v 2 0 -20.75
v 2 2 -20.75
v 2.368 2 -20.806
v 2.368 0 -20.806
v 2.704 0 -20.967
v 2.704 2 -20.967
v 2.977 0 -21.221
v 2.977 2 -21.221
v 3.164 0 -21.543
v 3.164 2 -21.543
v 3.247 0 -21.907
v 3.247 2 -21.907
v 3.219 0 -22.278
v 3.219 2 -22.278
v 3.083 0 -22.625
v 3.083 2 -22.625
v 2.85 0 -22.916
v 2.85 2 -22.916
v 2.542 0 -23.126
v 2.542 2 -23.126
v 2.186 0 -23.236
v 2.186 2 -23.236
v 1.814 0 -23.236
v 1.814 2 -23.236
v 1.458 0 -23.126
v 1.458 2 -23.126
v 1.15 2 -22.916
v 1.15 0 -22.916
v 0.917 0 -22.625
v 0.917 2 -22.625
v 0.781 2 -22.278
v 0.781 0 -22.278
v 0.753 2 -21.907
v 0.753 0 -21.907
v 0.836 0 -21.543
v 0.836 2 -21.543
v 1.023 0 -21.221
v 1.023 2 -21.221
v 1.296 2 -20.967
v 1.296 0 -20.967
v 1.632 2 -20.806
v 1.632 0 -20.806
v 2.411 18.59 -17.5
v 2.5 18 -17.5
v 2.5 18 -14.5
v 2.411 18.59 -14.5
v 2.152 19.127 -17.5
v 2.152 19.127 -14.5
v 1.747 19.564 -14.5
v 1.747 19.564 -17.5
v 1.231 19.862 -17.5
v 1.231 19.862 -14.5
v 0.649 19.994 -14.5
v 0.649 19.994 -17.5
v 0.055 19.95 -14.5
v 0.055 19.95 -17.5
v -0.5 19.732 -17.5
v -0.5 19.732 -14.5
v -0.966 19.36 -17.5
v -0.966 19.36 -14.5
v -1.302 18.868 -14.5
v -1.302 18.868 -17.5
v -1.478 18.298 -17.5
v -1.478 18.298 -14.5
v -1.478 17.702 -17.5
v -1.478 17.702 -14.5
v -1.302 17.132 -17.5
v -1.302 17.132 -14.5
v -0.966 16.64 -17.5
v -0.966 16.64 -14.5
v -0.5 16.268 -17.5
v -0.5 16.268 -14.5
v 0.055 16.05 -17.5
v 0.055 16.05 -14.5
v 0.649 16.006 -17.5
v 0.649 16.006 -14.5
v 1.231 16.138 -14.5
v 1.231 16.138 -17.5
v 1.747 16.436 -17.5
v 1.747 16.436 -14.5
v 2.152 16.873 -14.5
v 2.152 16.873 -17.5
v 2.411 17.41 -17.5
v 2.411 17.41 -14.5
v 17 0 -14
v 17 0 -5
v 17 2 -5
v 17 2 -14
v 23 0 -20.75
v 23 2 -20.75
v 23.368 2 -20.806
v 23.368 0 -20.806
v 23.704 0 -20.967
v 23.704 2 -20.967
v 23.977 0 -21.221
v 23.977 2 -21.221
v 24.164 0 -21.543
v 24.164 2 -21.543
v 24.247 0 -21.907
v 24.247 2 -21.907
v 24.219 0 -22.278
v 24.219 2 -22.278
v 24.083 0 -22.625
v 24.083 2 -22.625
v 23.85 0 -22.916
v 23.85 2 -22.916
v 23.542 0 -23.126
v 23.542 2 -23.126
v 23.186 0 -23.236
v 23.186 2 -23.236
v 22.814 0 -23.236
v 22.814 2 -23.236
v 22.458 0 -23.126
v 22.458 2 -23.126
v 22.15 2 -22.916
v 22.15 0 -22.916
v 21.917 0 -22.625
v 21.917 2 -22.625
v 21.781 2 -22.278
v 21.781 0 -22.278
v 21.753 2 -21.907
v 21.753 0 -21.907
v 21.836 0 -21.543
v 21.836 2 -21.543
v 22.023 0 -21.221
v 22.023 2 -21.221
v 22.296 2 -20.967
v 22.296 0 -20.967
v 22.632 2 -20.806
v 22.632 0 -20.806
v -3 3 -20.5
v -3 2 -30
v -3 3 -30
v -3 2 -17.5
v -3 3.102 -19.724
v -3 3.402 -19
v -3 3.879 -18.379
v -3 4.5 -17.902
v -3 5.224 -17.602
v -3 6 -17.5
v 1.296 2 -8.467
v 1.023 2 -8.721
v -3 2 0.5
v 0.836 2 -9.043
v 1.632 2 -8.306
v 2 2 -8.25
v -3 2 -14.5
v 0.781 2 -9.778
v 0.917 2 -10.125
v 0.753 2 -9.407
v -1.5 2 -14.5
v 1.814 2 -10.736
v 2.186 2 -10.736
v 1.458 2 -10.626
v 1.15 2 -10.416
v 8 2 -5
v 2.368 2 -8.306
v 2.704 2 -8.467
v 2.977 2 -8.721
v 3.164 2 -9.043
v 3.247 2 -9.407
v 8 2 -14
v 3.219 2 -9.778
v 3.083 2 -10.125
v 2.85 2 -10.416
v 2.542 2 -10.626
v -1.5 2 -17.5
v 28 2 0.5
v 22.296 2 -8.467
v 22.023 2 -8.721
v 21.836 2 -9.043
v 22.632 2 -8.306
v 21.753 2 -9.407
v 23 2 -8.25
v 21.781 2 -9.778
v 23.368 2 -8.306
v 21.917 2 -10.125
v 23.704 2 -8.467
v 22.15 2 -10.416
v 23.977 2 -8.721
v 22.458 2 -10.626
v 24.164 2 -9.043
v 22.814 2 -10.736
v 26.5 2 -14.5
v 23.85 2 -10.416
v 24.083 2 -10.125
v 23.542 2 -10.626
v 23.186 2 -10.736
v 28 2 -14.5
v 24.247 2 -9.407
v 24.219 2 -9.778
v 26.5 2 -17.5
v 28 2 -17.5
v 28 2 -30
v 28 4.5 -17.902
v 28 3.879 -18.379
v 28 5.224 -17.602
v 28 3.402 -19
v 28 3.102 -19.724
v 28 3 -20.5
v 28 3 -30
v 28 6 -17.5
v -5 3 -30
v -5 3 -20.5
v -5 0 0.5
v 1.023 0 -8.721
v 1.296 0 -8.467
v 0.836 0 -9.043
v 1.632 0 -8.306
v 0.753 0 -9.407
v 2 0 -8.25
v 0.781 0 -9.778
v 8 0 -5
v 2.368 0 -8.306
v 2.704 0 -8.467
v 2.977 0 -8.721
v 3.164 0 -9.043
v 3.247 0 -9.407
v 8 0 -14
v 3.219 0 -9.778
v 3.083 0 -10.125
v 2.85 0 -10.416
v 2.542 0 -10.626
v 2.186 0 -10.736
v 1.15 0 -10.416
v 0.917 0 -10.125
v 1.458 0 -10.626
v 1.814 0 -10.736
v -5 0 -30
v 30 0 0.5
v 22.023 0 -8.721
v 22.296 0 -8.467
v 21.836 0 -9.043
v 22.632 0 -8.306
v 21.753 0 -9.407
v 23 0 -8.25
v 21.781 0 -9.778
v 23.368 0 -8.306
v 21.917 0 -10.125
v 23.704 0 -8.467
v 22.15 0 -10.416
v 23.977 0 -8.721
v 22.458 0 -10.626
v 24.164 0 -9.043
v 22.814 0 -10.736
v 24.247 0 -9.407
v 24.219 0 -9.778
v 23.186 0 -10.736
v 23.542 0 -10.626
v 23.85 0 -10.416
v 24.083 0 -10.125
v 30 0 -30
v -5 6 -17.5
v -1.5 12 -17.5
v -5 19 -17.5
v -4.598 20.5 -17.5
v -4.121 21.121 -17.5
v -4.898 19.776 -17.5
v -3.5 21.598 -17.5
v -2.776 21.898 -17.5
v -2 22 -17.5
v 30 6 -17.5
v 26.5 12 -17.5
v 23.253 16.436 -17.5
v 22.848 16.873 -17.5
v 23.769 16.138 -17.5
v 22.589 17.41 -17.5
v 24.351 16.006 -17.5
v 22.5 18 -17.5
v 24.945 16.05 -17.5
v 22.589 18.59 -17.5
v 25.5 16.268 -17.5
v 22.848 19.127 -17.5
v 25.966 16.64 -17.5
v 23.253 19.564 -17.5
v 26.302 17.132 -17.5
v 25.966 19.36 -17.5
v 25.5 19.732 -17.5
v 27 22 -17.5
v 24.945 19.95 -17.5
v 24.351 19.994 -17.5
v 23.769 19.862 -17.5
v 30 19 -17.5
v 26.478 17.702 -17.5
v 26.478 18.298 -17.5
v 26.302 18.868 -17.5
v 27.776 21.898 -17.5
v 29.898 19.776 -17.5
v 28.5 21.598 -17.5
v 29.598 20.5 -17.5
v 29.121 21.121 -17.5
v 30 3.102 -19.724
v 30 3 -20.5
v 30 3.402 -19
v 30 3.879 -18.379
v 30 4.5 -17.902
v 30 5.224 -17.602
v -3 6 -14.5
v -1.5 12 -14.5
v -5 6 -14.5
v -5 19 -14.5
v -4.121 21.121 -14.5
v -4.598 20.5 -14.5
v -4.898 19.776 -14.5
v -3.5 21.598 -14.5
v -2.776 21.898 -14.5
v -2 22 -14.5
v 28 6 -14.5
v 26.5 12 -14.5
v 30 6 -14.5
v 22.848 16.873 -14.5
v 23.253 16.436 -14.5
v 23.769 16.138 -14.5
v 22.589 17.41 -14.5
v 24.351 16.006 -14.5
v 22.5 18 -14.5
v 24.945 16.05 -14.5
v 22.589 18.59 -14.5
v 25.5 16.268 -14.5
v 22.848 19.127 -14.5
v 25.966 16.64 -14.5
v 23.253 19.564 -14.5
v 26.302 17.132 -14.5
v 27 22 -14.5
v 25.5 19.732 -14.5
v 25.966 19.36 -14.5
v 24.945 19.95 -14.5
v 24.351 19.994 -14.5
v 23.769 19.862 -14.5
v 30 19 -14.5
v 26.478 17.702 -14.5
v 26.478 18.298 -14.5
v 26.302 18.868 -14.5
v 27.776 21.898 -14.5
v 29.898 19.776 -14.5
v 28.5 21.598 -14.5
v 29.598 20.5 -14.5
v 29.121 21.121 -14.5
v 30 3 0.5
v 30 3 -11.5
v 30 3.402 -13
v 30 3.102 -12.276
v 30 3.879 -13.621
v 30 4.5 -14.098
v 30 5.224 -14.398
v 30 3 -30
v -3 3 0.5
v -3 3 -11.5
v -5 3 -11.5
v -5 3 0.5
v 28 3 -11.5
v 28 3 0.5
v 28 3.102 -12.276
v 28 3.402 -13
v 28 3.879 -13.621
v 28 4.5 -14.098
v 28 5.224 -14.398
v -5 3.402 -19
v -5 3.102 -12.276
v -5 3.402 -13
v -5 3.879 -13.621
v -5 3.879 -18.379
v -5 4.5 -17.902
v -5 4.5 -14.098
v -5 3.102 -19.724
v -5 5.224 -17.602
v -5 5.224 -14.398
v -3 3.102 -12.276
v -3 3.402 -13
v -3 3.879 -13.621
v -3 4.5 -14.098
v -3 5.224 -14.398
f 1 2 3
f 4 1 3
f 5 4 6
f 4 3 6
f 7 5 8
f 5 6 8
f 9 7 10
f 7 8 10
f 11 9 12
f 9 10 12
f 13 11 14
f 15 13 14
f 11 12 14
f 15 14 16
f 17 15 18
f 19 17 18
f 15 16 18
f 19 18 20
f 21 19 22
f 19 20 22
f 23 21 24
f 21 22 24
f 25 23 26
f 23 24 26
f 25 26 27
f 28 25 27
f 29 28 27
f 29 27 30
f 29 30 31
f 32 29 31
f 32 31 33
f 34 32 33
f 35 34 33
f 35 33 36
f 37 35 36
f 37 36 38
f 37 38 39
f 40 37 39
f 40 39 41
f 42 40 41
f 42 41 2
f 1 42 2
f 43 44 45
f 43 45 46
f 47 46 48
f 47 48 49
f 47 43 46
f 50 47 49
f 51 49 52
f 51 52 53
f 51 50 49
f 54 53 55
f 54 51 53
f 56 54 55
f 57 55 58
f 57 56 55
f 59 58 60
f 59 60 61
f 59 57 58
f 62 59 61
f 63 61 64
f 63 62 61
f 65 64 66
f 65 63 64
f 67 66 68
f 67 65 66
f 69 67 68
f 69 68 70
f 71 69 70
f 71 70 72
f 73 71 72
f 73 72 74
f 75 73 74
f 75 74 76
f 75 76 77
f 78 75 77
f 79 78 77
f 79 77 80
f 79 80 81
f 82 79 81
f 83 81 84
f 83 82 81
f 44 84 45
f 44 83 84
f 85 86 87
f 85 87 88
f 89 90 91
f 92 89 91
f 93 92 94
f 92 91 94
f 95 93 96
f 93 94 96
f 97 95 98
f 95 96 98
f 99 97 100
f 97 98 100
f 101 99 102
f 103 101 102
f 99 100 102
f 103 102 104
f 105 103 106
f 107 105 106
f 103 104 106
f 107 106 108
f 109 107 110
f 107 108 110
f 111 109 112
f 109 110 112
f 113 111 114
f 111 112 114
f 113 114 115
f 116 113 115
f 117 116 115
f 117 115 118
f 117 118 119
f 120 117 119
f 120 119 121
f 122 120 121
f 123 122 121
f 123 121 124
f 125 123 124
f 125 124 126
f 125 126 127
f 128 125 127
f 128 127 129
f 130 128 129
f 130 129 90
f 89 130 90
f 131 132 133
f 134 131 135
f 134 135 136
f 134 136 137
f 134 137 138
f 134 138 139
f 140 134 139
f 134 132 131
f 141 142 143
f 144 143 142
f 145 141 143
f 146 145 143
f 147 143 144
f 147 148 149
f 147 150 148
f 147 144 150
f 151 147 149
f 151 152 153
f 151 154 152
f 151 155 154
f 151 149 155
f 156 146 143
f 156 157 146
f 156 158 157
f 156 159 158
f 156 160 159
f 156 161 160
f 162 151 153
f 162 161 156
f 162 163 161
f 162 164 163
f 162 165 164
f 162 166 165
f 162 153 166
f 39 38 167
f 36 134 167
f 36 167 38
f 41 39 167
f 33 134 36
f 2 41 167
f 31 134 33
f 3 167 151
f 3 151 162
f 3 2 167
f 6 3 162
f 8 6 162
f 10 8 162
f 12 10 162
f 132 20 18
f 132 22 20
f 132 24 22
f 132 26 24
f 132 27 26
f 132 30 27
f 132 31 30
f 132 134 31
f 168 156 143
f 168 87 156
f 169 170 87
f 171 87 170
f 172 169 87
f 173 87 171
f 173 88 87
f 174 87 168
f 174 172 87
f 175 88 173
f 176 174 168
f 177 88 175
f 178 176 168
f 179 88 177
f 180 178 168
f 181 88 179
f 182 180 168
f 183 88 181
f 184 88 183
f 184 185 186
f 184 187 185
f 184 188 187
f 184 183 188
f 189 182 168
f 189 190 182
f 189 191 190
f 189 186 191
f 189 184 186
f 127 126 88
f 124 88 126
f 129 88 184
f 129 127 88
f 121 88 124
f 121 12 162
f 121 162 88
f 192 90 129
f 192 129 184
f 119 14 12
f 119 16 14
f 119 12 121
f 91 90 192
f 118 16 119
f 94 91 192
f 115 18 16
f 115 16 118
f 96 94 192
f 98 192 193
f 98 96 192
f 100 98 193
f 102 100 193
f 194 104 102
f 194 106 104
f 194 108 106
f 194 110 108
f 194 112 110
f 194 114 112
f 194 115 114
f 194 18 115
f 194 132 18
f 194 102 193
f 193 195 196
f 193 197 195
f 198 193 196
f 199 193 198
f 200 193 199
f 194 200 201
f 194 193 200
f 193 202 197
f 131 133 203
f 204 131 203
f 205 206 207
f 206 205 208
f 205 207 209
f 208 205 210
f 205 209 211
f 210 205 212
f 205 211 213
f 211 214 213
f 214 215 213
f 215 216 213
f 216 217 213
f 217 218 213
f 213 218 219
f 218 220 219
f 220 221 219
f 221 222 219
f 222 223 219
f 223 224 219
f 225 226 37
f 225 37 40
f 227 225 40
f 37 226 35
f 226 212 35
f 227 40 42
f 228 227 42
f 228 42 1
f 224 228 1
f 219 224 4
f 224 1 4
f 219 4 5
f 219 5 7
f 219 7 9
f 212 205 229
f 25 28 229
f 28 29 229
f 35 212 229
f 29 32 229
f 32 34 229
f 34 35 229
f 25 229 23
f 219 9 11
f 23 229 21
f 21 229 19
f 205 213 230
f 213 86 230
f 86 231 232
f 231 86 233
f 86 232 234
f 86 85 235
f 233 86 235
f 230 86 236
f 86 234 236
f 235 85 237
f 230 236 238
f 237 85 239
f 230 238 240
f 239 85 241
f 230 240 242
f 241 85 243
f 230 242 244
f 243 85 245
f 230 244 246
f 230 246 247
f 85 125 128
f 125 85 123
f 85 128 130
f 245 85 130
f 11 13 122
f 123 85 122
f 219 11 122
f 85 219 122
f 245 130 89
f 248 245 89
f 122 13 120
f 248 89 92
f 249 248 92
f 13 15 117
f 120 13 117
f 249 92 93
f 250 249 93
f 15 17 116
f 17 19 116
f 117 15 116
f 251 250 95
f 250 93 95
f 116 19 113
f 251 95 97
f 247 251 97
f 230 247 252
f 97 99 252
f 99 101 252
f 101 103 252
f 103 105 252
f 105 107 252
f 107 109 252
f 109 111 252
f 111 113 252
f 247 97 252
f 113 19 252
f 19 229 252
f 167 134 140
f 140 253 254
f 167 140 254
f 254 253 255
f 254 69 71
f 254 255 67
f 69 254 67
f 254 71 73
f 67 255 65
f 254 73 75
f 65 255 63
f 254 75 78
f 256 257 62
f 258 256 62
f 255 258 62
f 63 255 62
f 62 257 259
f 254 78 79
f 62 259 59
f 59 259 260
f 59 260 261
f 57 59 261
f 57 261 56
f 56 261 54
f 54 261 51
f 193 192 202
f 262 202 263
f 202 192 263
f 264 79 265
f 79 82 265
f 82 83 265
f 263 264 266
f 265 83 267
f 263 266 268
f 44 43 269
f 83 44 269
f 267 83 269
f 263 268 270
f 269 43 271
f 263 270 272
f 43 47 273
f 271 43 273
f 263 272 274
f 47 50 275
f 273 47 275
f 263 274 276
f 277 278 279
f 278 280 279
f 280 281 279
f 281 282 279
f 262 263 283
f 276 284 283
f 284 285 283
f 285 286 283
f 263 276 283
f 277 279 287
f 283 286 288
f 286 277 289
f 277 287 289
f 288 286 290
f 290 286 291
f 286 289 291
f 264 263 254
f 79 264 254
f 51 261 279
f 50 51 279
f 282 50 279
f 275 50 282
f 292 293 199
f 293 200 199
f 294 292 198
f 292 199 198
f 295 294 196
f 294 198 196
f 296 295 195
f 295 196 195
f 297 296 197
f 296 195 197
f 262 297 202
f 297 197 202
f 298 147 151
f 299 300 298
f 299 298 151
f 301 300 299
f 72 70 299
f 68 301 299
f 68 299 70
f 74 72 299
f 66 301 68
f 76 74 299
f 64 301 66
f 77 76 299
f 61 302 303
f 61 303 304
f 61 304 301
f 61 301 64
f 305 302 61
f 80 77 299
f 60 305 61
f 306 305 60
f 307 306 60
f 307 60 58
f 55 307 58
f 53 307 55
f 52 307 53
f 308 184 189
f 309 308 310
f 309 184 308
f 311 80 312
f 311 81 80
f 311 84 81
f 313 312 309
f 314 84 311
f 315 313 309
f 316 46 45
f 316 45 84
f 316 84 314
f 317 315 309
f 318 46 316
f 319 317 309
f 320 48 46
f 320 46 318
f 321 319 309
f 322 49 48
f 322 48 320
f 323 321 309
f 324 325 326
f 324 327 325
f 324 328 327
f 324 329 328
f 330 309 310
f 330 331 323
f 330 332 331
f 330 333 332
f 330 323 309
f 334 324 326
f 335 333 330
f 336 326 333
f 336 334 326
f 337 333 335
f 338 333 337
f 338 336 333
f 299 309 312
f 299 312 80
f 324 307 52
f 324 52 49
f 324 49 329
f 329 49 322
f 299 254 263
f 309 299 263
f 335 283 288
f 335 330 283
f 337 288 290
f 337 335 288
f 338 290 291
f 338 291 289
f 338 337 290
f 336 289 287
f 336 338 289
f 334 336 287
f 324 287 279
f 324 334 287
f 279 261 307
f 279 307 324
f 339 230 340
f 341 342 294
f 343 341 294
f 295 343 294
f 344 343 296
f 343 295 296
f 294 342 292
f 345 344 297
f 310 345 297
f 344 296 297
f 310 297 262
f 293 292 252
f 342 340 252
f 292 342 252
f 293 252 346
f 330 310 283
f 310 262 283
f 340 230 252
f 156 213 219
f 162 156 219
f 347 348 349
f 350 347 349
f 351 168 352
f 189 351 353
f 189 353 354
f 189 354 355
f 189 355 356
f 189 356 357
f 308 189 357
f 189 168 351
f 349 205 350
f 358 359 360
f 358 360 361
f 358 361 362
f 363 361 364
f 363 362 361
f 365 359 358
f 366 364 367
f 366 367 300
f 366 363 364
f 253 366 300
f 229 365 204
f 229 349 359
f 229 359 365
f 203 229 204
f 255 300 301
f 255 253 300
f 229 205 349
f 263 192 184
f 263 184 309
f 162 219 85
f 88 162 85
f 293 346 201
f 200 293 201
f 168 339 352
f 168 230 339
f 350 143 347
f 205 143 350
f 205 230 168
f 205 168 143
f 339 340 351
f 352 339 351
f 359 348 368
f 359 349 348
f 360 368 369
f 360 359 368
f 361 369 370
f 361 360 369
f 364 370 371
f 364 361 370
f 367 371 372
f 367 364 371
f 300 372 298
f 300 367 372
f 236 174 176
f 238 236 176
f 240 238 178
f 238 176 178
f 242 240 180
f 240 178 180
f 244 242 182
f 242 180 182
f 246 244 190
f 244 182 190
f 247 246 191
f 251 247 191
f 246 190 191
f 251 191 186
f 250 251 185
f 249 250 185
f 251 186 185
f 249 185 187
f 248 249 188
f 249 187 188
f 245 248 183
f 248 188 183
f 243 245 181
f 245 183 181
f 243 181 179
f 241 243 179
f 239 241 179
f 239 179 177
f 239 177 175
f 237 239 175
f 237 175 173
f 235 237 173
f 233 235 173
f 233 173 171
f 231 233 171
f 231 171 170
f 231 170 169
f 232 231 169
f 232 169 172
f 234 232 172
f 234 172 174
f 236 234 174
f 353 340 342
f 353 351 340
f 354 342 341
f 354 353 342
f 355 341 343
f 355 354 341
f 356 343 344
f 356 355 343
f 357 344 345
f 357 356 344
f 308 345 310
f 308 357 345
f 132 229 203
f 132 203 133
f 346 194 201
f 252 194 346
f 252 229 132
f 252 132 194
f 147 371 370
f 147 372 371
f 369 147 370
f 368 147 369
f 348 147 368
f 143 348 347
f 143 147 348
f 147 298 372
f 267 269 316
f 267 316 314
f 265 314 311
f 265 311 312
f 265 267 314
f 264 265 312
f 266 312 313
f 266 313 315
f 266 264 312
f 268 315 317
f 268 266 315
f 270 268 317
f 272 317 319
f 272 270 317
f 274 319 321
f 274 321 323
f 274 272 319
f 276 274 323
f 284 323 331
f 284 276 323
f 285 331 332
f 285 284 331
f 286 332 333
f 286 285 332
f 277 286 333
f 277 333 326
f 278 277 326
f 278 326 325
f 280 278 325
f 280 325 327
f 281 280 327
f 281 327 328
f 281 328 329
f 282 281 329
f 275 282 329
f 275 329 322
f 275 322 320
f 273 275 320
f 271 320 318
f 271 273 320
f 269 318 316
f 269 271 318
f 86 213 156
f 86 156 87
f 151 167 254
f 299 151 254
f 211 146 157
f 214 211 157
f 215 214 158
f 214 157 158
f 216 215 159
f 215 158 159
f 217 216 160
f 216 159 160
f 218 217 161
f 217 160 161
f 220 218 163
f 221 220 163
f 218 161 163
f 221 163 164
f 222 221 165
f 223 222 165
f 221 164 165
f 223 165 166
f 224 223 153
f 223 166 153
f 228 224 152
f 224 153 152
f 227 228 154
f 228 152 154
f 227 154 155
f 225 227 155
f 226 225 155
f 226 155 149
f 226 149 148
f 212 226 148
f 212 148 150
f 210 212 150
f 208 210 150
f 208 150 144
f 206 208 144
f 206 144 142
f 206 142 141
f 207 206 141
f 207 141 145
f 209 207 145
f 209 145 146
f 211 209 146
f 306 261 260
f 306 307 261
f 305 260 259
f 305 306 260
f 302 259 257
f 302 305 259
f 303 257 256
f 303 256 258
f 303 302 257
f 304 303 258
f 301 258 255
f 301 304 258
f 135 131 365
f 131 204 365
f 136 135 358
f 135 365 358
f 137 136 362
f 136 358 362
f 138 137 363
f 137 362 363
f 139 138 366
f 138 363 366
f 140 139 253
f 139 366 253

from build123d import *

# Parameters (mm, degrees)
SKETCH9_W           = 35
SKETCH9_H           = 30.5
SKETCH9_W_2         = 9
SKETCH9_H_2         = 9
BOSS_EXTRUDE5_DEPTH = 2
BOSS_EXTRUDE6_DEPTH = 1
CUT_EXTRUDE4_REACH  = 44.474
SKETCH12_R          = 1.25
SKETCH16_W          = 35
SKETCH16_H          = 22
SKETCH16_R          = 2
SKETCH16_W_2        = 28
SKETCH16_H_2        = 10
BOSS_EXTRUDE9_DEPTH = 3
SKETCH17_W          = 31
SKETCH17_H          = 1
CUT_EXTRUDE8_DEPTH  = 47.864165415
FILLET3_R           = 3


with BuildPart() as part:
    # Sketch9 → Boss-Extrude5 (new body)
    with BuildSketch(Plane(origin=(0, 0, 0), x_dir=(1, 0, 0), z_dir=(0, 1, 0))):
        with Locations((12.5, 14.75)):
            Rectangle(SKETCH9_W, SKETCH9_H)
        with Locations((12.5, 9.5)):
            Rectangle(SKETCH9_W_2, SKETCH9_H_2, mode=Mode.SUBTRACT)
    extrude(amount=BOSS_EXTRUDE5_DEPTH)

    # Sketch10 → Boss-Extrude6 (add)
    with BuildSketch(Plane(origin=(0, 2, 0), x_dir=(1, 0, 0), z_dir=(0, 1, 0))):
        Polygon((28, -0.5), (28, 28), (-3, 28), (-3, -0.5), (-5, -0.5), (-5, 30), (30, 30), (30, -0.5), align=None)
    extrude(amount=BOSS_EXTRUDE6_DEPTH)

    # Sketch12 → Cut-Extrude4 (cut, up to next)
    with BuildSketch(Plane(origin=(0, 2, 0), x_dir=(1, 0, 0), z_dir=(0, 1, 0)), mode=Mode.PRIVATE) as cut_extrude4_sk1:
        with Locations(Location((2, 22, 0), (0, 0, 270))):
            Circle(SKETCH12_R)
    cut_extrude4_tool1 = extrude(cut_extrude4_sk1.sketch, amount=-CUT_EXTRUDE4_REACH, mode=Mode.PRIVATE) & part.part
    # Sketch12 → Cut-Extrude4 (cut, up to next)
    with BuildSketch(Plane(origin=(0, 2, 0), x_dir=(1, 0, 0), z_dir=(0, 1, 0)), mode=Mode.PRIVATE) as cut_extrude4_sk2:
        with Locations(Location((2, 9.5, 0), (0, 0, 270))):
            Circle(SKETCH12_R)
    cut_extrude4_tool2 = extrude(cut_extrude4_sk2.sketch, amount=-CUT_EXTRUDE4_REACH, mode=Mode.PRIVATE) & part.part
    # Sketch12 → Cut-Extrude4 (cut, up to next)
    with BuildSketch(Plane(origin=(0, 2, 0), x_dir=(1, 0, 0), z_dir=(0, 1, 0)), mode=Mode.PRIVATE) as cut_extrude4_sk3:
        with Locations(Location((23, 9.5, 0), (0, 0, 270))):
            Circle(SKETCH12_R)
    cut_extrude4_tool3 = extrude(cut_extrude4_sk3.sketch, amount=-CUT_EXTRUDE4_REACH, mode=Mode.PRIVATE) & part.part
    # Sketch12 → Cut-Extrude4 (cut, up to next)
    with BuildSketch(Plane(origin=(0, 2, 0), x_dir=(1, 0, 0), z_dir=(0, 1, 0)), mode=Mode.PRIVATE) as cut_extrude4_sk4:
        with Locations(Location((23, 22, 0), (0, 0, 270))):
            Circle(SKETCH12_R)
    cut_extrude4_tool4 = extrude(cut_extrude4_sk4.sketch, amount=-CUT_EXTRUDE4_REACH, mode=Mode.PRIVATE) & part.part
    add(cut_extrude4_tool1.solids().sort_by_distance((2, 2, -22))[0], mode=Mode.SUBTRACT)
    add(cut_extrude4_tool2.solids().sort_by_distance((2, 2, -9.5))[0], mode=Mode.SUBTRACT)
    add(cut_extrude4_tool3.solids().sort_by_distance((23, 2, -9.5))[0], mode=Mode.SUBTRACT)
    add(cut_extrude4_tool4.solids().sort_by_distance((23, 2, -22))[0], mode=Mode.SUBTRACT)

    # Sketch16 → Boss-Extrude9 (add)
    with BuildSketch(Plane.XY.offset(-17.5)):
        with Locations((12.5, 11)):
            Rectangle(SKETCH16_W, SKETCH16_H)
        with Locations((0.5, 18)):
            Circle(SKETCH16_R, mode=Mode.SUBTRACT)
        with Locations(Location((24.5, 18, 0), (0, 0, 180))):
            Circle(SKETCH16_R, mode=Mode.SUBTRACT)
        with Locations((12.5, 7)):
            Rectangle(SKETCH16_W_2, SKETCH16_H_2, mode=Mode.SUBTRACT)
    extrude(amount=BOSS_EXTRUDE9_DEPTH)

    # Sketch17 → Cut-Extrude8 (cut, through all)
    with BuildSketch(Plane.XY.offset(-28)):
        with Locations((12.5, 2.5)):
            Rectangle(SKETCH17_W, SKETCH17_H)
    extrude(amount=-CUT_EXTRUDE8_DEPTH, mode=Mode.SUBTRACT)

    # Fillet3
    fillet3_edges = [part.edges().sort_by_distance(p)[0] for p in [
        (-4, 3, -17.5),
        (29, 3, -17.5),
        (-4, 3, -14.5),
        (29, 3, -14.5),
        (-5, 22, -16),
        (30, 22, -16),
    ]]
    fillet(fillet3_edges, radius=FILLET3_R)


solid = part.part
